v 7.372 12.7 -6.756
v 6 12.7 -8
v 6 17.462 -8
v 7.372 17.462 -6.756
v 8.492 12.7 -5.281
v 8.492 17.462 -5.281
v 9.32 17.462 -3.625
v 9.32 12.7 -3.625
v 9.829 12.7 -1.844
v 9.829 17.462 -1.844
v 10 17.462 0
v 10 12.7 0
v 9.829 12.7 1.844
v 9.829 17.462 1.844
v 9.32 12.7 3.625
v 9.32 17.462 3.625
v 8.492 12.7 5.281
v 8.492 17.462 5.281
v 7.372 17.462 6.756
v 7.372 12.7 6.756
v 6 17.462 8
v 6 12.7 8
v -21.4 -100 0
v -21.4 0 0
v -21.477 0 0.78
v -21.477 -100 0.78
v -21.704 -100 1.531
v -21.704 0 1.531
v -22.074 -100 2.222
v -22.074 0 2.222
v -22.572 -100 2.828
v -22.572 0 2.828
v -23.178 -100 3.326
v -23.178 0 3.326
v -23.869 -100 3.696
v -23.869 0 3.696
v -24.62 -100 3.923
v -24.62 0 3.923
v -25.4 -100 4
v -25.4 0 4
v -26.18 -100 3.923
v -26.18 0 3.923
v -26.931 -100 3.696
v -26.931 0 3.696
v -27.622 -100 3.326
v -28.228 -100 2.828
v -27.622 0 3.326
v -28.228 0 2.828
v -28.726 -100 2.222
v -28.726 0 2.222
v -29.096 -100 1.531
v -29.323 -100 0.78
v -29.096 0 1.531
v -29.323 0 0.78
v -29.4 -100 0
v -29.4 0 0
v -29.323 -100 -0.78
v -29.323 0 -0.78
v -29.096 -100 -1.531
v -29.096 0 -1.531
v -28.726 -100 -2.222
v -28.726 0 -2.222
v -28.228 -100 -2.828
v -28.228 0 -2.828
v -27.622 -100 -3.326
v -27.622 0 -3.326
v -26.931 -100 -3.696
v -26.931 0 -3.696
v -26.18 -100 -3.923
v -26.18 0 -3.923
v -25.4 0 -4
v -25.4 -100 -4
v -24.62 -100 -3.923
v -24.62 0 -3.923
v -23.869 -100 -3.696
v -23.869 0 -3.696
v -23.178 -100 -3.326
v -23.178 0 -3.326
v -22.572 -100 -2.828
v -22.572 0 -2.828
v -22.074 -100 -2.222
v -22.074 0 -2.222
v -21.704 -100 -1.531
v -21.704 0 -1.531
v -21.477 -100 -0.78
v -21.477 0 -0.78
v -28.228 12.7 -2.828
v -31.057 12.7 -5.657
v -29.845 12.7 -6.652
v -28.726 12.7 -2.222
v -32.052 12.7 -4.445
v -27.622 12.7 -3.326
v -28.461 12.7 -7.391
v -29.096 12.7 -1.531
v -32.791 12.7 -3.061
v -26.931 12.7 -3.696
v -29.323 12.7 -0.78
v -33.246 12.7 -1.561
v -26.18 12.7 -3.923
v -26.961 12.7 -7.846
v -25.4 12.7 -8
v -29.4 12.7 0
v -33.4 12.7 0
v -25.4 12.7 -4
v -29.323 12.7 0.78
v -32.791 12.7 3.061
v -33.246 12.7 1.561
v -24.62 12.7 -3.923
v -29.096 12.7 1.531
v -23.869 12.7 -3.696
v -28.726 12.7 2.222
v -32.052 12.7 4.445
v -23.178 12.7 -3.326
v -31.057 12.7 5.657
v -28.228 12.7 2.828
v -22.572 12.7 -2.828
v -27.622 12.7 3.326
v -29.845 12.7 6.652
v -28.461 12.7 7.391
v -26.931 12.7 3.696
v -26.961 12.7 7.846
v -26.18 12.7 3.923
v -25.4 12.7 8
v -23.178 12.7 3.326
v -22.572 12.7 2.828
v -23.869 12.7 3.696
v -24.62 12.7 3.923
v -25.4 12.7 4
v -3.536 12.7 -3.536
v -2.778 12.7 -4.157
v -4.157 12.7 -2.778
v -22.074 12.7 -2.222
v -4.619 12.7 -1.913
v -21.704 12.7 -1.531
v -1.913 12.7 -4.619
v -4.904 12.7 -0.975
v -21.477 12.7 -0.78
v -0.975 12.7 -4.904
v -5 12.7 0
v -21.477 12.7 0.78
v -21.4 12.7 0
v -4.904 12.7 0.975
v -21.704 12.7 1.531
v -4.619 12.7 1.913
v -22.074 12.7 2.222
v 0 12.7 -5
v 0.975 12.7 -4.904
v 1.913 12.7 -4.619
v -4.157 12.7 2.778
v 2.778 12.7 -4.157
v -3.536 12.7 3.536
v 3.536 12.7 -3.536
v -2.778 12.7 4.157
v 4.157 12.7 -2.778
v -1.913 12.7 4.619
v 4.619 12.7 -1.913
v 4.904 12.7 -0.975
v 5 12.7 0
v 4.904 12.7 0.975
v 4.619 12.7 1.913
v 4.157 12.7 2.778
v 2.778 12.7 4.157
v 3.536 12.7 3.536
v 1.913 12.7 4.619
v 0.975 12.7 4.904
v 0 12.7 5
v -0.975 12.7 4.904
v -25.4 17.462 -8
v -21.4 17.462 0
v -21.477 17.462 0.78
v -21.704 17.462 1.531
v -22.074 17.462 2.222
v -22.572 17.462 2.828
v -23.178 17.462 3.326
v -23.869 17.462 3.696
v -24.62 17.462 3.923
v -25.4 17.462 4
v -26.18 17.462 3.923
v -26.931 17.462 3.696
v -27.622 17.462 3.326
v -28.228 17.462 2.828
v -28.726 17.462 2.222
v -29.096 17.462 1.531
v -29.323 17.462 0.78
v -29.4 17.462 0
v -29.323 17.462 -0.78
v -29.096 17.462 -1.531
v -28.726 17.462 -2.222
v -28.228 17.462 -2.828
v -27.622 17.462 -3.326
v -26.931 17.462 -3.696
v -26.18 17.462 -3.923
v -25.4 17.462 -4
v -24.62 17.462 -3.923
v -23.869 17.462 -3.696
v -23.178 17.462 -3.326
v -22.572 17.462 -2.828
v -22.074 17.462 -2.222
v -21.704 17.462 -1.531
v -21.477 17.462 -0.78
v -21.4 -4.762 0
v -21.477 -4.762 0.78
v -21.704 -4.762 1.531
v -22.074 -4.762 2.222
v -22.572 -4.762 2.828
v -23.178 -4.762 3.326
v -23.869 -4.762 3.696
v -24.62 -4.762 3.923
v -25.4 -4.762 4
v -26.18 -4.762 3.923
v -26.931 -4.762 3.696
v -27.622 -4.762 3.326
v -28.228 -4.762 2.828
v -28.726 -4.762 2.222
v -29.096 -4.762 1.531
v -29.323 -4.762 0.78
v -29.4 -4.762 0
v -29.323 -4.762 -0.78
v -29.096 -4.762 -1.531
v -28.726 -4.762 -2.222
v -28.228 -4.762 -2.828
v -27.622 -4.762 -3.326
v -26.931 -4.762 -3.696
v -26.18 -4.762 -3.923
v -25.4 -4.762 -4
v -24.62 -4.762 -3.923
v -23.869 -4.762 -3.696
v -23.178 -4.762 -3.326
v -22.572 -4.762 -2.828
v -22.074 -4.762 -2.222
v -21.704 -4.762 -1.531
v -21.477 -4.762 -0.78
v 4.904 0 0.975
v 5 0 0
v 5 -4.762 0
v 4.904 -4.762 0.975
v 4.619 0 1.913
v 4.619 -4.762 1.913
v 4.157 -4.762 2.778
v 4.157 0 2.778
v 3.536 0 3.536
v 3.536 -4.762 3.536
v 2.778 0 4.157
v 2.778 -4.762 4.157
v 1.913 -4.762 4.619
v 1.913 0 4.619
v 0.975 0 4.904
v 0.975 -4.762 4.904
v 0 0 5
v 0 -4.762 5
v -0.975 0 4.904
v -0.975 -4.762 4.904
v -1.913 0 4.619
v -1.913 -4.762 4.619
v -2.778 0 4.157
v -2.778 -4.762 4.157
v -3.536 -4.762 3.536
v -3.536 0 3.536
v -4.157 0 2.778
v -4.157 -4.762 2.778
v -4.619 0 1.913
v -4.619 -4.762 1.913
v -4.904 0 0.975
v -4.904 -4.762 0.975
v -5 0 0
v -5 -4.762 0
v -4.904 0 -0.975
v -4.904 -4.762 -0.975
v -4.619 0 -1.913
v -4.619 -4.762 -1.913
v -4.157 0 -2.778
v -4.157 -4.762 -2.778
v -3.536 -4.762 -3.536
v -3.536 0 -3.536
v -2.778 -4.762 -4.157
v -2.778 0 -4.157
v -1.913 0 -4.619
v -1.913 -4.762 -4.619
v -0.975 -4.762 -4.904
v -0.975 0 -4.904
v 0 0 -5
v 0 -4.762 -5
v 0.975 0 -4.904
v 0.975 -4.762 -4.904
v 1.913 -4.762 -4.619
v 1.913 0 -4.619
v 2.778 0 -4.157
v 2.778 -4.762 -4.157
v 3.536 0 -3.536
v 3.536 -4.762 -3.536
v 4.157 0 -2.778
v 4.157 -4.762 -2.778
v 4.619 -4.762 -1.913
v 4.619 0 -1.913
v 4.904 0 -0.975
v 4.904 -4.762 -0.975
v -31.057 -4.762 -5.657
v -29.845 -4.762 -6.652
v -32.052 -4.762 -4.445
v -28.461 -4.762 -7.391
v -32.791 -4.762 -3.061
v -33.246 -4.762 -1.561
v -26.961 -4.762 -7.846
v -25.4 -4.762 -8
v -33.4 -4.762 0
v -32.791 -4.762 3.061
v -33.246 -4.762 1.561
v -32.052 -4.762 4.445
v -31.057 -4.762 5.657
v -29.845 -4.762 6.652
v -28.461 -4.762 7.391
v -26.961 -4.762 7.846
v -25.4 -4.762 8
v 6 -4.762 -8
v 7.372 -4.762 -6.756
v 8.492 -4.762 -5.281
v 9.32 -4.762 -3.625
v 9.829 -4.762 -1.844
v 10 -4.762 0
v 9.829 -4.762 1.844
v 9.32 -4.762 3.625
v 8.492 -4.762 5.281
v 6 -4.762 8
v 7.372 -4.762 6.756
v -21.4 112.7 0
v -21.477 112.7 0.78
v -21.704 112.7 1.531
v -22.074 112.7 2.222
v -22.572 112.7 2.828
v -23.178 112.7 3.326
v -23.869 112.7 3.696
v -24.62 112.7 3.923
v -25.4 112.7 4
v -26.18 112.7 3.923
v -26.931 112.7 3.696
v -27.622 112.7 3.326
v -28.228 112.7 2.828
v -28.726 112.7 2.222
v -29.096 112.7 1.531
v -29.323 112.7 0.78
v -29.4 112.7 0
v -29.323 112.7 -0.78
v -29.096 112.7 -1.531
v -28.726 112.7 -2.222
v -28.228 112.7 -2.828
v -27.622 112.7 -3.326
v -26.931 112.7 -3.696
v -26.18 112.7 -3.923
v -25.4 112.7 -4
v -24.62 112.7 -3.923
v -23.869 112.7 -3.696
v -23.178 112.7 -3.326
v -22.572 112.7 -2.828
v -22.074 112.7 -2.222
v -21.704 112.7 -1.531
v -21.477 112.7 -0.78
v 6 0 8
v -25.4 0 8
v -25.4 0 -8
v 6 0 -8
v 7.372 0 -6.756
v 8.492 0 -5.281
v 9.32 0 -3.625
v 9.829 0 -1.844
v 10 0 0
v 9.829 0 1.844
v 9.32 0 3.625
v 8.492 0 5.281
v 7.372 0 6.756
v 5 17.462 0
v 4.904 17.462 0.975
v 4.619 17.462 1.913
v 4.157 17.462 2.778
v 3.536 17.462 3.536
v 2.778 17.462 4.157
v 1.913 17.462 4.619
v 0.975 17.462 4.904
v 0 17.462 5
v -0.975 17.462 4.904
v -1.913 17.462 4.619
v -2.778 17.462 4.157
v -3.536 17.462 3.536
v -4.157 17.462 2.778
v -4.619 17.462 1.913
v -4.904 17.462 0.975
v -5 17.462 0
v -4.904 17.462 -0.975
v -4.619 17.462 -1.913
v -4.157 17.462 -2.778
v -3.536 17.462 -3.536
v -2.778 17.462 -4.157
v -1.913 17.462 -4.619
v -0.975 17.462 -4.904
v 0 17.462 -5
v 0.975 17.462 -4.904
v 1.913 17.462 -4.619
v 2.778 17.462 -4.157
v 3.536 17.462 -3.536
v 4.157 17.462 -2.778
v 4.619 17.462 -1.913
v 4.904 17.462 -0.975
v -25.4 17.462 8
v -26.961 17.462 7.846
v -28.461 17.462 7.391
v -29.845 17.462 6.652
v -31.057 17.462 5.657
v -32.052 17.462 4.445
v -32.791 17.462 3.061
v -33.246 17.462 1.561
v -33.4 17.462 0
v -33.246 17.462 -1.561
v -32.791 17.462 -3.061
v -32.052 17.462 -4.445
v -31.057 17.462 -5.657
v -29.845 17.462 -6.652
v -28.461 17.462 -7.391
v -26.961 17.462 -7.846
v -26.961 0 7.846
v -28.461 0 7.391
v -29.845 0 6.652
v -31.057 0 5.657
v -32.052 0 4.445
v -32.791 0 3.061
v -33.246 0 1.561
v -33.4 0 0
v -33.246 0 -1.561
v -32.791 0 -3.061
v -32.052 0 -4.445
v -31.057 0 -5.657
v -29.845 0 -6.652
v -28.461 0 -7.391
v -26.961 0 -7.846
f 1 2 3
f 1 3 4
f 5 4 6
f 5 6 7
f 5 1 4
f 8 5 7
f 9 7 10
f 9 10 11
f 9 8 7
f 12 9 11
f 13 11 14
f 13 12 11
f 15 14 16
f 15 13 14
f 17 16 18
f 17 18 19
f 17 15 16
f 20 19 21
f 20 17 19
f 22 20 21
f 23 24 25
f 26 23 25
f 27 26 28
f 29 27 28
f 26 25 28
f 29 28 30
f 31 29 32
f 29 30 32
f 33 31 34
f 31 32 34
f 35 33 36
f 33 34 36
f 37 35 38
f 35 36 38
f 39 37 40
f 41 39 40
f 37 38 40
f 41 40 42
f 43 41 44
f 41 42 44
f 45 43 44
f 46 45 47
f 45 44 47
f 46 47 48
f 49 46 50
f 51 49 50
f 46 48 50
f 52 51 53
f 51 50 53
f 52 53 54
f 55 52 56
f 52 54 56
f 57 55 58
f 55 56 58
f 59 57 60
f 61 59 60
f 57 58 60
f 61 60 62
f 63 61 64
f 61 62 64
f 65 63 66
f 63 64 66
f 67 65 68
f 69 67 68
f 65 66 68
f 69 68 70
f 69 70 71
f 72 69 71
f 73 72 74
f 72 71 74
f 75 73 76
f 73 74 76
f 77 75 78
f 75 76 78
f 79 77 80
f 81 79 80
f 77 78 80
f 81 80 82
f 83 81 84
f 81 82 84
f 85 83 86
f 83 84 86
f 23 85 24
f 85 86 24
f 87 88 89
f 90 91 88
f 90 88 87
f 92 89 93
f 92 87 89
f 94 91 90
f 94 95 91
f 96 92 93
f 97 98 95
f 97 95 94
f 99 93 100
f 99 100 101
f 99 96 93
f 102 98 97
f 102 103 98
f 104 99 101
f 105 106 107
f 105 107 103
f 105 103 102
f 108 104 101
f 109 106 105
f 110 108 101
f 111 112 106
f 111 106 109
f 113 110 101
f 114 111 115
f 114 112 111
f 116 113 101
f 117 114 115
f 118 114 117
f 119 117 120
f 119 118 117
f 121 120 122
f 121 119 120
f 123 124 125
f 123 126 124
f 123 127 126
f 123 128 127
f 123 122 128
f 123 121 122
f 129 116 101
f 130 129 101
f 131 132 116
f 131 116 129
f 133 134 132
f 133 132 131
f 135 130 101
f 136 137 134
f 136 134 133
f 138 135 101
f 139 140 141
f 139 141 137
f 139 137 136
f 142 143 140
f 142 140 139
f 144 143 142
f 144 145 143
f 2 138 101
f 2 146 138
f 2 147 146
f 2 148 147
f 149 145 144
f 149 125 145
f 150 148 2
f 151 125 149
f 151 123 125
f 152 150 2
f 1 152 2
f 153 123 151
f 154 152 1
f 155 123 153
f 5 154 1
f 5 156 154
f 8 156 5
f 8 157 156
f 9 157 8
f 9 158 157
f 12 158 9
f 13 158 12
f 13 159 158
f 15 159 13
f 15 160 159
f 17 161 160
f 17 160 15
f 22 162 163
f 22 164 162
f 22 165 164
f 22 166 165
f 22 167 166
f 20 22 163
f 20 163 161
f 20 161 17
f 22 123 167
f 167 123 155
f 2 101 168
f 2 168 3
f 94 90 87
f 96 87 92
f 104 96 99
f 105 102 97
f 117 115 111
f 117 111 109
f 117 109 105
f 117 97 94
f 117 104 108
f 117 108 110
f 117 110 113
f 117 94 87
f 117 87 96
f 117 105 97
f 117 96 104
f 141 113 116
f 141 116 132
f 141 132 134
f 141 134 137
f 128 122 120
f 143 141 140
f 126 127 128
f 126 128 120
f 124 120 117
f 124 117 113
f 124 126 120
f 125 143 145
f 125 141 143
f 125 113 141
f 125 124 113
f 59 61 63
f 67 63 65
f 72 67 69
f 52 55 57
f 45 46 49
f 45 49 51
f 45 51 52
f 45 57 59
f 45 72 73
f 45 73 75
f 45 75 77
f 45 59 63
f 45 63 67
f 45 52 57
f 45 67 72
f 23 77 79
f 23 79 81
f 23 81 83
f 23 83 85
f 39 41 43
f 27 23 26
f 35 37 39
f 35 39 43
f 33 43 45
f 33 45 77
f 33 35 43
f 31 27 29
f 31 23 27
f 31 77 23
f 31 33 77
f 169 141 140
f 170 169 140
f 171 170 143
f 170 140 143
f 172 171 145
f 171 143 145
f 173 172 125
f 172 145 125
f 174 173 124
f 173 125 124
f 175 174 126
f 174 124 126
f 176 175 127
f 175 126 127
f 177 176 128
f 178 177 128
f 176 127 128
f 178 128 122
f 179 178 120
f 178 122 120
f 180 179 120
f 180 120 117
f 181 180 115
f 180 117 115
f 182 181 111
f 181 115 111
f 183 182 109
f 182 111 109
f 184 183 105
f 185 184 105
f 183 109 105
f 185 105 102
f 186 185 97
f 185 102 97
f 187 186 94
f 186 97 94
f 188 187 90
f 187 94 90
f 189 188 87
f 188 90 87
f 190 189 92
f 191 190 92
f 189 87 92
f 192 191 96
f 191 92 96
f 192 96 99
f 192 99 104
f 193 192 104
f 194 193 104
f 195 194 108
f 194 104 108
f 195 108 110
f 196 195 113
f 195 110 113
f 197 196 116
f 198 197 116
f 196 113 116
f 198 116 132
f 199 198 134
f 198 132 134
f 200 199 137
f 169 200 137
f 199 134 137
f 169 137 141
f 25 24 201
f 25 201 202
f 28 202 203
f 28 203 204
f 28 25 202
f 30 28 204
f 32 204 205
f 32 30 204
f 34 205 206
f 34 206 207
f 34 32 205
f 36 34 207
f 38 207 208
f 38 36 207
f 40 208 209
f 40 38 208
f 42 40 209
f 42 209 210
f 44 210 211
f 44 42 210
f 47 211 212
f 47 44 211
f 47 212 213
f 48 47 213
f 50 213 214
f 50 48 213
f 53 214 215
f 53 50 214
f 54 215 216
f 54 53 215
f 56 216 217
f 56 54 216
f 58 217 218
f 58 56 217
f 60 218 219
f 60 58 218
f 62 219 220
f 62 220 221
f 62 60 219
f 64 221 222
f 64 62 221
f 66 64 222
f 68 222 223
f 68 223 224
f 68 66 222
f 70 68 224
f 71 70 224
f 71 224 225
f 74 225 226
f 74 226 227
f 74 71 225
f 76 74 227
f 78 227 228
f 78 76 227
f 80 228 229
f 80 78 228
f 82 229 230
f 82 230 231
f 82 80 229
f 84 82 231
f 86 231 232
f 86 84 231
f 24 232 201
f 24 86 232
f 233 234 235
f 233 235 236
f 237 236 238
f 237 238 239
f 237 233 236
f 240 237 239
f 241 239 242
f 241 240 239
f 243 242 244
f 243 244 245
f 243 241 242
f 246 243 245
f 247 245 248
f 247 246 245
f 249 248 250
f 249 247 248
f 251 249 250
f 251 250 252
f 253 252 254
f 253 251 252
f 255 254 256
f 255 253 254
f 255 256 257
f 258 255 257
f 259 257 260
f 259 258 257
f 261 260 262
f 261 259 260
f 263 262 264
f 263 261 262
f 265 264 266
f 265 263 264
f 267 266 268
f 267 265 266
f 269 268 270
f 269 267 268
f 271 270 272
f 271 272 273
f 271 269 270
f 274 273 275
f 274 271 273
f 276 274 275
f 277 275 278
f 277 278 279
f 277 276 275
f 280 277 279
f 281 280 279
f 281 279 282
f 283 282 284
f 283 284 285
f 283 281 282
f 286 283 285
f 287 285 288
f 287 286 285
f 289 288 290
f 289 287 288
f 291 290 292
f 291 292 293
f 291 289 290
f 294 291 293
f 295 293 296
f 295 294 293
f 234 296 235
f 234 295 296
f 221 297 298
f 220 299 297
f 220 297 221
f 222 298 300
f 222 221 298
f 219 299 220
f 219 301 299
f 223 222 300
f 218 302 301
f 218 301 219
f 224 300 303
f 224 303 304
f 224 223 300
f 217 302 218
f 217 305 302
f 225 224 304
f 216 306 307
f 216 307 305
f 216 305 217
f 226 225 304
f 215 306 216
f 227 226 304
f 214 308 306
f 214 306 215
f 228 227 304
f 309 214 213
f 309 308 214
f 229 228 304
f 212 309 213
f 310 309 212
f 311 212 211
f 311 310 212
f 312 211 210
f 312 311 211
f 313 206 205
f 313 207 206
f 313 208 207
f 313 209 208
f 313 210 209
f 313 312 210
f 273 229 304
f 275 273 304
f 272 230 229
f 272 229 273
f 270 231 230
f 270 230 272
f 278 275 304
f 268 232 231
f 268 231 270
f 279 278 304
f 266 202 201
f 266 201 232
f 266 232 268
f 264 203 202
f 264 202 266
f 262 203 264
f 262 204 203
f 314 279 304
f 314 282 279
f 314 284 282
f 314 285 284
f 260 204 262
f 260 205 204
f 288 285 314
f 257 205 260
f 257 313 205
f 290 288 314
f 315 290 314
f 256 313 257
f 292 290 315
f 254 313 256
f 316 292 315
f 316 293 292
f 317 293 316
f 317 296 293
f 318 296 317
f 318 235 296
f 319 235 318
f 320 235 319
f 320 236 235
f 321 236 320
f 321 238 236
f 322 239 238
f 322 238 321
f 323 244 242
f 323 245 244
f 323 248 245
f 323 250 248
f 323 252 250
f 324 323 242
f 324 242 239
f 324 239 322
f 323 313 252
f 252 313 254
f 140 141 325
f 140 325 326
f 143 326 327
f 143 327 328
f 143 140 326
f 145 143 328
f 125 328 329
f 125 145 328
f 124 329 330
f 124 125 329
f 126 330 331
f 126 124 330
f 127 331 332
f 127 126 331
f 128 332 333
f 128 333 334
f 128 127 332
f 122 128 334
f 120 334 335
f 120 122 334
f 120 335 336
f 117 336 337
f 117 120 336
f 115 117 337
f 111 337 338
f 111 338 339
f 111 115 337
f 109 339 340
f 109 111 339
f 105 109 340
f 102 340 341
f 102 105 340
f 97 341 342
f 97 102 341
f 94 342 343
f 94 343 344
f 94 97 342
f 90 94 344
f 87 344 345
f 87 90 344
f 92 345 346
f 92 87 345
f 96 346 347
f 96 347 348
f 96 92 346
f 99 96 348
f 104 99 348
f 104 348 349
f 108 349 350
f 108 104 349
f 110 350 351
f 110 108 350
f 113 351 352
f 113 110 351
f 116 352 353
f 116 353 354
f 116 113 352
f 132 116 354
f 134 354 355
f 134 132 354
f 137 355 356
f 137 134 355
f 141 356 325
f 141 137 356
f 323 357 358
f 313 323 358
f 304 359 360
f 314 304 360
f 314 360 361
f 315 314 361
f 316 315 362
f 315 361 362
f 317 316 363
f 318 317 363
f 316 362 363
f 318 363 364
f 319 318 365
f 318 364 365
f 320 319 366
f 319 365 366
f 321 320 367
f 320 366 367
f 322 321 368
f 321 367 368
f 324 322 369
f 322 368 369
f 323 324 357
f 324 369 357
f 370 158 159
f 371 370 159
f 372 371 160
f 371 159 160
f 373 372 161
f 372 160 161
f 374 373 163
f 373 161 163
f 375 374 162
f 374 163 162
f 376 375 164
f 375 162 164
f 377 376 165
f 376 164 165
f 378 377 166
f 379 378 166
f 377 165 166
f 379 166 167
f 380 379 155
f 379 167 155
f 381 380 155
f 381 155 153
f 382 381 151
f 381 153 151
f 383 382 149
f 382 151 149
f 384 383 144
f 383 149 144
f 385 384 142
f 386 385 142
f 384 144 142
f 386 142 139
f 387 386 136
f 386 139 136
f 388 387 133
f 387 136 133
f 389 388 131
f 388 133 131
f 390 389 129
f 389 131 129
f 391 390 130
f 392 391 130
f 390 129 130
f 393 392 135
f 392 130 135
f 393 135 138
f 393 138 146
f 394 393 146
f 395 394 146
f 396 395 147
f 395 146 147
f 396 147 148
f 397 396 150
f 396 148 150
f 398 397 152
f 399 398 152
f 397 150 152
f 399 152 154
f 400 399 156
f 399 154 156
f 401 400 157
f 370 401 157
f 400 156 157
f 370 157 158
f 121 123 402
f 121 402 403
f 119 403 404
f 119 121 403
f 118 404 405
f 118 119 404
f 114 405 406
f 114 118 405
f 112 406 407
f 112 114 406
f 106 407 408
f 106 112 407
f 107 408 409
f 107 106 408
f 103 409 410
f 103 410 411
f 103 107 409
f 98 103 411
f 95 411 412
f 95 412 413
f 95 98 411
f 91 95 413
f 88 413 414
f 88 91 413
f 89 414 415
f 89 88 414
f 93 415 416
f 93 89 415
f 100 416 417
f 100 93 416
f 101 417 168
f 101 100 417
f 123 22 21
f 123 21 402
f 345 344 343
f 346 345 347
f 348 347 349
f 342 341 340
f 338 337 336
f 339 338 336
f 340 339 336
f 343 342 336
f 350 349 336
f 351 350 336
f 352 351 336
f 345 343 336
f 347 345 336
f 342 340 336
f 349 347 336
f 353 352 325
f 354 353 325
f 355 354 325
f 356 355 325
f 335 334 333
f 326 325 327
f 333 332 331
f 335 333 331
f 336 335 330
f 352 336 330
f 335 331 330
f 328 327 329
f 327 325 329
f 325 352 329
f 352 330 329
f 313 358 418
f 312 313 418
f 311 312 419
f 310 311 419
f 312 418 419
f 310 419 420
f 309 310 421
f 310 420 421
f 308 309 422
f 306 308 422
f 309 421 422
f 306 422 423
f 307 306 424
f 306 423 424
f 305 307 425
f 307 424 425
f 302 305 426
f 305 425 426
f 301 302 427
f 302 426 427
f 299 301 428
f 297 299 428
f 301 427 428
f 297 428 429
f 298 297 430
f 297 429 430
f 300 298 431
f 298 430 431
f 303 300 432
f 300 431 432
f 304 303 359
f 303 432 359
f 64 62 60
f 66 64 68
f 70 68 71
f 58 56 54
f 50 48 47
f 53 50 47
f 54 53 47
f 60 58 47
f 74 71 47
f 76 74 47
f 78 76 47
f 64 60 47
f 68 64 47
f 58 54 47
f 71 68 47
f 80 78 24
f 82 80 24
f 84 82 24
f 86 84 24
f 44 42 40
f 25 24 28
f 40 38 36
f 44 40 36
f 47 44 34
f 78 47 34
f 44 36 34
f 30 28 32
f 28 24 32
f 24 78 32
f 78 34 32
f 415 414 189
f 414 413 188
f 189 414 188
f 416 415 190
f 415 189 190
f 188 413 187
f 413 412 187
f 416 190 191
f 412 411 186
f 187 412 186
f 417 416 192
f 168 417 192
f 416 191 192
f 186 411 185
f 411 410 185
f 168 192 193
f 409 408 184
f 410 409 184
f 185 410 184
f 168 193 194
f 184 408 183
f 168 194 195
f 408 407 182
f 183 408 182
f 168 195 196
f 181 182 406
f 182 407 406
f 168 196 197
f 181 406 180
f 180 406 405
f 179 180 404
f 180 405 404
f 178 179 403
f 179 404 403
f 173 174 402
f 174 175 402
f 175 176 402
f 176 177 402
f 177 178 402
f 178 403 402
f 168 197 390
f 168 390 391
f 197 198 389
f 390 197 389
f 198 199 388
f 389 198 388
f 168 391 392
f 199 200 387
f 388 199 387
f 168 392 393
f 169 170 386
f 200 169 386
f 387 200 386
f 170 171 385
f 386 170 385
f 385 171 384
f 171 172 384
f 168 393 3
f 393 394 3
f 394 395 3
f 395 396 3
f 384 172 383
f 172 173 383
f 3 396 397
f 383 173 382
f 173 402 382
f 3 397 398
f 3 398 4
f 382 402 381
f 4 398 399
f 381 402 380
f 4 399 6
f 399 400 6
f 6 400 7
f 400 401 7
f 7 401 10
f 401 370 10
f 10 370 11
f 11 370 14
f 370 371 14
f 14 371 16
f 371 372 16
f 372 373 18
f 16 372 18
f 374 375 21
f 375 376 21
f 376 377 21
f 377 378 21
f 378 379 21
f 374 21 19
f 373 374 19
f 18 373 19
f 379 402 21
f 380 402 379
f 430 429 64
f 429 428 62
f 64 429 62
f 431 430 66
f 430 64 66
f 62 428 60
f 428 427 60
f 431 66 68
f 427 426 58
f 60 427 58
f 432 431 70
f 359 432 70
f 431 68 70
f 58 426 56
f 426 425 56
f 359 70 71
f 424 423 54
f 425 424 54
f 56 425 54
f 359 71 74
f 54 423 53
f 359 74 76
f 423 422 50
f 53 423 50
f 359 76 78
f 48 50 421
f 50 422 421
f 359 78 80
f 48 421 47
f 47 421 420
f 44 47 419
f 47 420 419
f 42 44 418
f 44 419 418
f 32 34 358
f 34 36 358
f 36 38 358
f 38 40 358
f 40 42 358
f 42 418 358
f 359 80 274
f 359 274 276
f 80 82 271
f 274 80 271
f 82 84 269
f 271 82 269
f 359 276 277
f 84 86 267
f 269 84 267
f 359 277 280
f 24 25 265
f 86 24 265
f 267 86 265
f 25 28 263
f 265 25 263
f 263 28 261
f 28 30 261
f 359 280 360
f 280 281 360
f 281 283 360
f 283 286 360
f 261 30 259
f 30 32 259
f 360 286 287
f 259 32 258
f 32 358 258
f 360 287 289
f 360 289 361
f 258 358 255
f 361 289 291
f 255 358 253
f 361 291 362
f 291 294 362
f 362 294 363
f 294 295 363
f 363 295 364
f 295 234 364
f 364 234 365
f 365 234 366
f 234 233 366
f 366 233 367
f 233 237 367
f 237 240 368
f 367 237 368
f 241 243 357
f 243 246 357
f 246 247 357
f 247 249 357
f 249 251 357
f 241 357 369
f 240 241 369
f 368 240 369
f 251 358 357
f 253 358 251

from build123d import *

# Parameters (mm, degrees)
F0_R     = 4
F0_R_2   = 5
F1_DEPTH = 4.7625
F2_R     = 4
F3_DEPTH = 100


with BuildPart() as f1:
    # F0 (on Front) → F1 (new body)
    with BuildSketch(Plane.XZ):
        with BuildLine():
            Line((6, 8), (-25.4, 8))
            ThreePointArc((-25.4, 8), (-33.4, 0), (-25.4, -8))
            Line((-25.4, -8), (6, -8))
            ThreePointArc((6, -8), (10, 0), (6, 8))
        make_face()
        with Locations((-25.4, 0)):
            Circle(F0_R, mode=Mode.SUBTRACT)
        Circle(F0_R_2, mode=Mode.SUBTRACT)
    extrude(amount=F1_DEPTH)


with BuildPart() as f3:
    # F2 (on Front) → F3 (new body)
    with BuildSketch(Plane.XZ):
        with Locations((-25.4, 0)):
            Circle(F2_R)
    extrude(amount=F3_DEPTH)


with BuildPart() as f5_1:
    # F5: instance of F1
    add(f1.part.mirror(Plane.XZ.offset(-6.35)))


with BuildPart() as f5_2:
    # F5: instance of F3
    add(f3.part.mirror(Plane.XZ.offset(-6.35)))


solid = Compound([f1.part, f3.part, f5_1.part, f5_2.part])
